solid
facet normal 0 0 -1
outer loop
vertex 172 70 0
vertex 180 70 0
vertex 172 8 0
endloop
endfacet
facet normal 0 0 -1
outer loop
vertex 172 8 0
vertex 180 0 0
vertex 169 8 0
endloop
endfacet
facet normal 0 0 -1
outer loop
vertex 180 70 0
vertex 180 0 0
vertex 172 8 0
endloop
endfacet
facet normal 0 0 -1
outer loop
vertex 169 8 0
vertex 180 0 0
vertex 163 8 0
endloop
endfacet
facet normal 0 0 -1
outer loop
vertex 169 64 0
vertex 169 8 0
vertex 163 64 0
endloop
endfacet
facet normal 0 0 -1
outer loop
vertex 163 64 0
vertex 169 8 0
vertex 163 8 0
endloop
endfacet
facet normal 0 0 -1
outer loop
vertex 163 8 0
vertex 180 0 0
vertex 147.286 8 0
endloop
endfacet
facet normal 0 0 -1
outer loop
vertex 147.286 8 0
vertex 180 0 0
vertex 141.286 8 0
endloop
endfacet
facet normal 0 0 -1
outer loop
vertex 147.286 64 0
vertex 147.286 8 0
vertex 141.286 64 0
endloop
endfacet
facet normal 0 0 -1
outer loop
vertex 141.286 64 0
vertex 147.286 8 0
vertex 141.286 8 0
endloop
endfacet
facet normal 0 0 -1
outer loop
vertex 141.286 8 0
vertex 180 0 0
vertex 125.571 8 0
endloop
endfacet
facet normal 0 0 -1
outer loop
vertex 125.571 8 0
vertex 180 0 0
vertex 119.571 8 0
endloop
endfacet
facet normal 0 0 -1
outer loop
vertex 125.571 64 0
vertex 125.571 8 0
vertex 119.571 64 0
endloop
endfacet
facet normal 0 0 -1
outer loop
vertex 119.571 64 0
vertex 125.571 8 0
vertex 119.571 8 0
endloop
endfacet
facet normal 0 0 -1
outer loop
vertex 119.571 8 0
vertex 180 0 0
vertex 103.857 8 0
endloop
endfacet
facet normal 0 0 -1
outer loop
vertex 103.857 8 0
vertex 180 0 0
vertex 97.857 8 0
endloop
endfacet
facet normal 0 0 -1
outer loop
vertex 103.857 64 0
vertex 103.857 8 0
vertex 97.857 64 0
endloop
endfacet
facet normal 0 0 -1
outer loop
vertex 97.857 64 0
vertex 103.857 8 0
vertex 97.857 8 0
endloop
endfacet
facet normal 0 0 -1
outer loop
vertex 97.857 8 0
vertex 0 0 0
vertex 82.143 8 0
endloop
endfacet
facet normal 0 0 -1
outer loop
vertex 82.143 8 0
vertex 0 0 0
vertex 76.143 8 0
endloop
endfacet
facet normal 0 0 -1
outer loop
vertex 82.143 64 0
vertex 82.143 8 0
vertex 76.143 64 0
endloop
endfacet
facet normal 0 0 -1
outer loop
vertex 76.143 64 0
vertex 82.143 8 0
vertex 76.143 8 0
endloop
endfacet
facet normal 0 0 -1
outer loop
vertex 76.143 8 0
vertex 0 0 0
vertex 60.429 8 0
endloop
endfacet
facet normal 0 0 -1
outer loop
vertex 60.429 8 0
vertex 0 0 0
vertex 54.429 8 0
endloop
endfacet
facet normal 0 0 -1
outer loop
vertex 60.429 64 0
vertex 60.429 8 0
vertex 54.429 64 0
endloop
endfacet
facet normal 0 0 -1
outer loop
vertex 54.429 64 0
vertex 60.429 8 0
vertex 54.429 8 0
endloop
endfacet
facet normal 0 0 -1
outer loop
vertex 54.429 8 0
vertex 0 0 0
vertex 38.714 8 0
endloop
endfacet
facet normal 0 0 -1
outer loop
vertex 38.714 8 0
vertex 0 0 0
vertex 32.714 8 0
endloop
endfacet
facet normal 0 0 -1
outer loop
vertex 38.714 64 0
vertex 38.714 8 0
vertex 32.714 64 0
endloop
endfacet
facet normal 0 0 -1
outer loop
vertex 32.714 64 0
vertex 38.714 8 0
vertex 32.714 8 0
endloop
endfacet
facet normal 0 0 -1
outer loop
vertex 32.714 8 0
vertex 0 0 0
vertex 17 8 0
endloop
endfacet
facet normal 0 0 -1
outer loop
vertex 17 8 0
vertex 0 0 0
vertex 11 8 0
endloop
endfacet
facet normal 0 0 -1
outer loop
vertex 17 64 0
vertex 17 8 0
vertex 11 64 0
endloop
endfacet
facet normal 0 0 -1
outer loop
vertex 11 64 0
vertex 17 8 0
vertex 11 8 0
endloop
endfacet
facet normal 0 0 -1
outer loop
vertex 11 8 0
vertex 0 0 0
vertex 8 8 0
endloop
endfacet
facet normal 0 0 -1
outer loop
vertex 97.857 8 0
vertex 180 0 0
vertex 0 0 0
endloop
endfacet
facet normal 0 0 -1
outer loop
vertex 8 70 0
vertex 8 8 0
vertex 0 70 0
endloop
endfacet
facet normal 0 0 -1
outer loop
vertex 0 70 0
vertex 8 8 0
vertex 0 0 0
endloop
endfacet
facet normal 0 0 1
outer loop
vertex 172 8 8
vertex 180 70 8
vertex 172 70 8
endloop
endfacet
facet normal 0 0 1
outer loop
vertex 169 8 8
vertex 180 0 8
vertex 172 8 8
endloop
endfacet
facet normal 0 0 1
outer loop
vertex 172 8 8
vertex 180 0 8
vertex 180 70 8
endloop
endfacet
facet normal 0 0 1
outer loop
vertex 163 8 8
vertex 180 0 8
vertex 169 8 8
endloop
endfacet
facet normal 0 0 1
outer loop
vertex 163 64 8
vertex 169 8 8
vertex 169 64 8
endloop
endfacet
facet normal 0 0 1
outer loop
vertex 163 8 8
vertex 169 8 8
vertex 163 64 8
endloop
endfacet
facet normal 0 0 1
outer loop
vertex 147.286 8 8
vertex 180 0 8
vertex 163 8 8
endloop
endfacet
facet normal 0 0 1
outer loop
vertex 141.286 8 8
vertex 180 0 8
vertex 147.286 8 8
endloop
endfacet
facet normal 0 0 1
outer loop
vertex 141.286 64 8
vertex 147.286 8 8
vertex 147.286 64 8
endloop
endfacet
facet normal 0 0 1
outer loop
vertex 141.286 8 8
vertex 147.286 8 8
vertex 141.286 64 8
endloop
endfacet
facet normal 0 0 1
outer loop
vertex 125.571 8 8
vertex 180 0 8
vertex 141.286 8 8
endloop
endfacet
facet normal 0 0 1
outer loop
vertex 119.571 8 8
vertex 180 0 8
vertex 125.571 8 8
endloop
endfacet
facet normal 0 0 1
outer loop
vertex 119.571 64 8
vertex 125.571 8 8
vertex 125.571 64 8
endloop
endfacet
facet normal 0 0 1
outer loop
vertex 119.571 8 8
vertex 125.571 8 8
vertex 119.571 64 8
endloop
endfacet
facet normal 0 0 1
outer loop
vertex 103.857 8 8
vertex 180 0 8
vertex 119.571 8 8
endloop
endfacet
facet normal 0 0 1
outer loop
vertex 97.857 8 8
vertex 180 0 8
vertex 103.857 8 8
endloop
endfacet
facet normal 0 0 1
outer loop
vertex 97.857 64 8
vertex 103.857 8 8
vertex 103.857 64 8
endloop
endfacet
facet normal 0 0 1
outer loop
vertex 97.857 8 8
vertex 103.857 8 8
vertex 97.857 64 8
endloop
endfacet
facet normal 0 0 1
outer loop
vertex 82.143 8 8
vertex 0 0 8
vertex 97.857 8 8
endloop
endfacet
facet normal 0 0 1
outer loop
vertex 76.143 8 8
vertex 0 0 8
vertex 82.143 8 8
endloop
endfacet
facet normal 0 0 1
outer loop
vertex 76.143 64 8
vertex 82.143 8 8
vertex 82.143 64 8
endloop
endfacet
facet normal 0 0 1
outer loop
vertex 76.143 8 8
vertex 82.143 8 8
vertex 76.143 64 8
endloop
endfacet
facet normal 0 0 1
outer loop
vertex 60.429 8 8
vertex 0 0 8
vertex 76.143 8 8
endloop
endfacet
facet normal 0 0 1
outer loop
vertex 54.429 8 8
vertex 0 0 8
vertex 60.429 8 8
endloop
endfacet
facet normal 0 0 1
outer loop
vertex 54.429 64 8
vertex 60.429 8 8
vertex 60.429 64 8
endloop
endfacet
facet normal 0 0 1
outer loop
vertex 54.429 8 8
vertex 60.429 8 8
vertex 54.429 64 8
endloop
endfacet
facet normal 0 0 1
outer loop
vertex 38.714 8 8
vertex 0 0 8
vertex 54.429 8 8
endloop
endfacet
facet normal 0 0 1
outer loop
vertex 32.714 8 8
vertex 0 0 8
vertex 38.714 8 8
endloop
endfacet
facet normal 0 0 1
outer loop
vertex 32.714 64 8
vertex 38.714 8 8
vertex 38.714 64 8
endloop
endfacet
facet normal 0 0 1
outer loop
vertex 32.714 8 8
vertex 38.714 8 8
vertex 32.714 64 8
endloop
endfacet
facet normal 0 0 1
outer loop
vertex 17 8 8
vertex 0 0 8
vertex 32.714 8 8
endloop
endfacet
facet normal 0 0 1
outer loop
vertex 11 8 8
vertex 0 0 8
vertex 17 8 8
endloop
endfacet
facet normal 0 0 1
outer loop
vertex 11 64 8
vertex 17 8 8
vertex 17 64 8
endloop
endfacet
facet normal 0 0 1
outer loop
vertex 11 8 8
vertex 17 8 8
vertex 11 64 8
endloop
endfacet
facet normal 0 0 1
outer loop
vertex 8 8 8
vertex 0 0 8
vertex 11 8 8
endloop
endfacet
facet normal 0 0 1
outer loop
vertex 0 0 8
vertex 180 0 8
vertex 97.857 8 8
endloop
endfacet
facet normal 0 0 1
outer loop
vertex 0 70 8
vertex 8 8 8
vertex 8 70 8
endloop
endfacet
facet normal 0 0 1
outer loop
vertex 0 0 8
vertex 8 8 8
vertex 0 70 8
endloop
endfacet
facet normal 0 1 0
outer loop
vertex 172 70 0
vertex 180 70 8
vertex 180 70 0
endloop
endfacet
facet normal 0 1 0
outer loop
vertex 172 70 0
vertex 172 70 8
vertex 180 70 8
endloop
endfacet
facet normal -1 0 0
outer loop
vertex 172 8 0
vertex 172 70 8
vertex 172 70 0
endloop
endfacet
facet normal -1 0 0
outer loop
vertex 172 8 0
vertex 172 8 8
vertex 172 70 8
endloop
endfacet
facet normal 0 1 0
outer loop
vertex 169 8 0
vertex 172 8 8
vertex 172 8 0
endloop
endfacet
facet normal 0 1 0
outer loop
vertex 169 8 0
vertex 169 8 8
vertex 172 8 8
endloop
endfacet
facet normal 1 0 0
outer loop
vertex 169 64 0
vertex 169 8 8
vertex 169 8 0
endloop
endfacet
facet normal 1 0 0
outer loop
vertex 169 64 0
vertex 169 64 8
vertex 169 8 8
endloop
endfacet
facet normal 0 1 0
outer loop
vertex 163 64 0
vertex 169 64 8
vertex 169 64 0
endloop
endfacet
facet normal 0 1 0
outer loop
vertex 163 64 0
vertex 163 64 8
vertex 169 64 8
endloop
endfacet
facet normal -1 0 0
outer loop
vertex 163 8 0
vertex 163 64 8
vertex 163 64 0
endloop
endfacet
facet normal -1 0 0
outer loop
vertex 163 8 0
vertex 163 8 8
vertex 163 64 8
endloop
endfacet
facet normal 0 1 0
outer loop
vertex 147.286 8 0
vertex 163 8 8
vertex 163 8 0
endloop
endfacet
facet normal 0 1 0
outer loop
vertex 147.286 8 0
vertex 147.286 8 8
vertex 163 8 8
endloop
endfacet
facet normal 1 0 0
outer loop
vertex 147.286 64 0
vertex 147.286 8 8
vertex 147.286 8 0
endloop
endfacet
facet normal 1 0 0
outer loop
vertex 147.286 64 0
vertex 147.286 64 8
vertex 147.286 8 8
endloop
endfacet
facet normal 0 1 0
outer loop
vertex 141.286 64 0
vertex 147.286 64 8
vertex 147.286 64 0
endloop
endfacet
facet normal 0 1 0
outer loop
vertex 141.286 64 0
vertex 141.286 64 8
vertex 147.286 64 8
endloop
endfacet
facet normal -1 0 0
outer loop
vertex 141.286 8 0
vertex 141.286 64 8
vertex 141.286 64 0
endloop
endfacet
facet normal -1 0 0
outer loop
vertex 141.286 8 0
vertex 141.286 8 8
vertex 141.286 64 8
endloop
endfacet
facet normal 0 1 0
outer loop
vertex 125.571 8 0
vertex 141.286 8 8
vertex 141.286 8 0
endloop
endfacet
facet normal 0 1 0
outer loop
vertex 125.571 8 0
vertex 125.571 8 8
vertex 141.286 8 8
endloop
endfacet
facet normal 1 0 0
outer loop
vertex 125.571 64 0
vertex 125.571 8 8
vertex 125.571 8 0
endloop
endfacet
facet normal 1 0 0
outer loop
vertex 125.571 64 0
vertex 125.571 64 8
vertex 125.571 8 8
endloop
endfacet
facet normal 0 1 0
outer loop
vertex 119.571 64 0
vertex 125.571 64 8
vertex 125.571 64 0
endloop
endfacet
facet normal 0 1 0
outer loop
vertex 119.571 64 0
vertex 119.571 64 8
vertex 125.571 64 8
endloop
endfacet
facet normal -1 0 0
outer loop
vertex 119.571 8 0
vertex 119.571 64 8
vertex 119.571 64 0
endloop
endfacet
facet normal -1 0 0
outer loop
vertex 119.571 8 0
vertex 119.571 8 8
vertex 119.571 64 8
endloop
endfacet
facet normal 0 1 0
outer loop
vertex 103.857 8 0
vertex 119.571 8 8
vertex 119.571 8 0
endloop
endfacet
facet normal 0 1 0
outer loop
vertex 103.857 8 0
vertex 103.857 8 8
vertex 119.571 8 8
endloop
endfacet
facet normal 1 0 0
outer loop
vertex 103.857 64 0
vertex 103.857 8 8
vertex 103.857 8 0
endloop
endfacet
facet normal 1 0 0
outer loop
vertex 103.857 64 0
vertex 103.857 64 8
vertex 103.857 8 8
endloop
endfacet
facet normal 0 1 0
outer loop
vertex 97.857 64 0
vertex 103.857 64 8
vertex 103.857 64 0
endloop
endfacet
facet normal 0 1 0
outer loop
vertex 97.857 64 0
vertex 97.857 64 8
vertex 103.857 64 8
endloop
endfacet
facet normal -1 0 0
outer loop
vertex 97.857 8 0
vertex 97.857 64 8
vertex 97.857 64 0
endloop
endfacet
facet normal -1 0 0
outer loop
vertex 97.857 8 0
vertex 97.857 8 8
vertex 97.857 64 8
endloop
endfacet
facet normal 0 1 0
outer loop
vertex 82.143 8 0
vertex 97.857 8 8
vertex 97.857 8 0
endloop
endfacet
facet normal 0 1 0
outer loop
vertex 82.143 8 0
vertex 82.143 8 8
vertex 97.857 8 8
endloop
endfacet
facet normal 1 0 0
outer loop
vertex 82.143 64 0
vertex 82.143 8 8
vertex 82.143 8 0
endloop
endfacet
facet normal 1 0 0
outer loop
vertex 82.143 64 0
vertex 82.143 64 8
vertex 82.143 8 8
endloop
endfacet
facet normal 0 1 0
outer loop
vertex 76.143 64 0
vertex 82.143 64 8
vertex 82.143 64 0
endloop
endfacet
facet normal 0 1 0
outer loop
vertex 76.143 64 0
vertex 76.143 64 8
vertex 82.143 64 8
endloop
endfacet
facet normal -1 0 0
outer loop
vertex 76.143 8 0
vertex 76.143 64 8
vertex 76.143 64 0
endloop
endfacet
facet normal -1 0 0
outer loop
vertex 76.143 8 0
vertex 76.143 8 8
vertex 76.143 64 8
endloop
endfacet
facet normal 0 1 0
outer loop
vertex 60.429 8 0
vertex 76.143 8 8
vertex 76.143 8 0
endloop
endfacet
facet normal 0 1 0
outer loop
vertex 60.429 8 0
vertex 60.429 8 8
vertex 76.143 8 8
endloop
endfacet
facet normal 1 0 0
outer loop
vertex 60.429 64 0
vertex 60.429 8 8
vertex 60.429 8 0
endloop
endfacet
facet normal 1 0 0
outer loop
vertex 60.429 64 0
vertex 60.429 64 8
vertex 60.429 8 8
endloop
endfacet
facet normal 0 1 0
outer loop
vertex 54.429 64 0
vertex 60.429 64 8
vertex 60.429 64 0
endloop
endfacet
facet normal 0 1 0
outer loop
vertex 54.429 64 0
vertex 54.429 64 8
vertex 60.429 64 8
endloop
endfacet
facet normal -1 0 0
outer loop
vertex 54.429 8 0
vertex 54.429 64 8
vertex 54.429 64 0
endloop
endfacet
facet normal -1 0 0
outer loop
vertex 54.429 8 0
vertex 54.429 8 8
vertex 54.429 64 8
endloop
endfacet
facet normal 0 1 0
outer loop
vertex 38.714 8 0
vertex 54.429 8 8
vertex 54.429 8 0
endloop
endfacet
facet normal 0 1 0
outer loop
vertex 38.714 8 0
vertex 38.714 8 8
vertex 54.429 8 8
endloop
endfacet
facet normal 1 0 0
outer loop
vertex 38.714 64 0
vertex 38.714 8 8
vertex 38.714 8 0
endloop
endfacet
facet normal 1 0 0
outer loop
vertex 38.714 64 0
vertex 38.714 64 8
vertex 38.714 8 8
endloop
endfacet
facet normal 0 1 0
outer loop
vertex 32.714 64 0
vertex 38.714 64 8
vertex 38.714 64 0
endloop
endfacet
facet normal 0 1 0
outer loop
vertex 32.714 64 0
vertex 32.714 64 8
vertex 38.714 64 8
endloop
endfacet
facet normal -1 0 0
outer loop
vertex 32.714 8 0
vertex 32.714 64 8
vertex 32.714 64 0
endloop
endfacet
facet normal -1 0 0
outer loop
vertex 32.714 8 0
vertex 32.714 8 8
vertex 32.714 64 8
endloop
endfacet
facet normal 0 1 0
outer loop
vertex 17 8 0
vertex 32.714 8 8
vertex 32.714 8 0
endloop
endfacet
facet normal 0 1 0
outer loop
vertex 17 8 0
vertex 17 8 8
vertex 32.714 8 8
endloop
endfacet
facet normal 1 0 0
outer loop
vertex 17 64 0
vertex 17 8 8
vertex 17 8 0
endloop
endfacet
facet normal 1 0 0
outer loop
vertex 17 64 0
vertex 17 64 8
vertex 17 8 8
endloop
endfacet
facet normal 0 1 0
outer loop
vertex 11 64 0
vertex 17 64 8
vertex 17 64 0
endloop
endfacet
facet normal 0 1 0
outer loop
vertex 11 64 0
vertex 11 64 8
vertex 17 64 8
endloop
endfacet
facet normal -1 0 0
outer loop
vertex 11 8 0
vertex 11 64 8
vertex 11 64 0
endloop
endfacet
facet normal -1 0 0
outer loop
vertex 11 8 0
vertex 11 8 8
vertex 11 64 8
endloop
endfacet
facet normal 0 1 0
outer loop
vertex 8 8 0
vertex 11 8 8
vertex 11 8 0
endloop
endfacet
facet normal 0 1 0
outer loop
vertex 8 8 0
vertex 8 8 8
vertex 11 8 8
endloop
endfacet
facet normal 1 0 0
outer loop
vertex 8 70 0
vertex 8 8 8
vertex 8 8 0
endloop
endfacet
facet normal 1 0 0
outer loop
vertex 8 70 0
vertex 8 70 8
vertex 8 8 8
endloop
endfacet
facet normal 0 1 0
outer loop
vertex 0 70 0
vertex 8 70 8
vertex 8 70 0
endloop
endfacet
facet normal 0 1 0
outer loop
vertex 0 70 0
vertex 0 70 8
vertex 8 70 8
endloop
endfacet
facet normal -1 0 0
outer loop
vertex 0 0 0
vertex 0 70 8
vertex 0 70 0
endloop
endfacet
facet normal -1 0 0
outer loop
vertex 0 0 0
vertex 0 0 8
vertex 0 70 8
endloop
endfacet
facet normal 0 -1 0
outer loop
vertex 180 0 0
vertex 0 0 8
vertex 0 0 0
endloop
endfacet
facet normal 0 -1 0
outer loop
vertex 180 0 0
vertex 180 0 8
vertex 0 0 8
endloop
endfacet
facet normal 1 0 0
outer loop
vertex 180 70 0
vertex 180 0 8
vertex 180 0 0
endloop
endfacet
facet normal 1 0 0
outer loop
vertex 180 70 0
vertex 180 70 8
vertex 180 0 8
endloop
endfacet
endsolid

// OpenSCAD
$fn = 32;

// ----------------------------------------------------------------------
// Guard grille: 8 slats over a 180 x 70 mm plate
// ----------------------------------------------------------------------

// --- parameters (mm) ---
profile_height = 8;       // extrusion height
profile_points = 40;      // points of the closed outline

profile = [[0, 0], [180, 0], [180, 70], [172, 70], [172, 8], [169, 8], [169, 64], [163, 64], [163, 8], [147.286, 8], [147.286, 64], [141.286, 64], [141.286, 8], [125.571, 8], [125.571, 64], [119.571, 64], [119.571, 8], [103.857, 8], [103.857, 64], [97.857, 64], [97.857, 8], [82.143, 8], [82.143, 64], [76.143, 64], [76.143, 8], [60.429, 8], [60.429, 64], [54.429, 64], [54.429, 8], [38.714, 8], [38.714, 64], [32.714, 64], [32.714, 8], [17, 8], [17, 64], [11, 64], [11, 8], [8, 8], [8, 70], [0, 70]];  // single closed polygon, 40 points, counter clockwise

// --- the one profile operation ---
linear_extrude(height = profile_height) polygon(points = profile);
